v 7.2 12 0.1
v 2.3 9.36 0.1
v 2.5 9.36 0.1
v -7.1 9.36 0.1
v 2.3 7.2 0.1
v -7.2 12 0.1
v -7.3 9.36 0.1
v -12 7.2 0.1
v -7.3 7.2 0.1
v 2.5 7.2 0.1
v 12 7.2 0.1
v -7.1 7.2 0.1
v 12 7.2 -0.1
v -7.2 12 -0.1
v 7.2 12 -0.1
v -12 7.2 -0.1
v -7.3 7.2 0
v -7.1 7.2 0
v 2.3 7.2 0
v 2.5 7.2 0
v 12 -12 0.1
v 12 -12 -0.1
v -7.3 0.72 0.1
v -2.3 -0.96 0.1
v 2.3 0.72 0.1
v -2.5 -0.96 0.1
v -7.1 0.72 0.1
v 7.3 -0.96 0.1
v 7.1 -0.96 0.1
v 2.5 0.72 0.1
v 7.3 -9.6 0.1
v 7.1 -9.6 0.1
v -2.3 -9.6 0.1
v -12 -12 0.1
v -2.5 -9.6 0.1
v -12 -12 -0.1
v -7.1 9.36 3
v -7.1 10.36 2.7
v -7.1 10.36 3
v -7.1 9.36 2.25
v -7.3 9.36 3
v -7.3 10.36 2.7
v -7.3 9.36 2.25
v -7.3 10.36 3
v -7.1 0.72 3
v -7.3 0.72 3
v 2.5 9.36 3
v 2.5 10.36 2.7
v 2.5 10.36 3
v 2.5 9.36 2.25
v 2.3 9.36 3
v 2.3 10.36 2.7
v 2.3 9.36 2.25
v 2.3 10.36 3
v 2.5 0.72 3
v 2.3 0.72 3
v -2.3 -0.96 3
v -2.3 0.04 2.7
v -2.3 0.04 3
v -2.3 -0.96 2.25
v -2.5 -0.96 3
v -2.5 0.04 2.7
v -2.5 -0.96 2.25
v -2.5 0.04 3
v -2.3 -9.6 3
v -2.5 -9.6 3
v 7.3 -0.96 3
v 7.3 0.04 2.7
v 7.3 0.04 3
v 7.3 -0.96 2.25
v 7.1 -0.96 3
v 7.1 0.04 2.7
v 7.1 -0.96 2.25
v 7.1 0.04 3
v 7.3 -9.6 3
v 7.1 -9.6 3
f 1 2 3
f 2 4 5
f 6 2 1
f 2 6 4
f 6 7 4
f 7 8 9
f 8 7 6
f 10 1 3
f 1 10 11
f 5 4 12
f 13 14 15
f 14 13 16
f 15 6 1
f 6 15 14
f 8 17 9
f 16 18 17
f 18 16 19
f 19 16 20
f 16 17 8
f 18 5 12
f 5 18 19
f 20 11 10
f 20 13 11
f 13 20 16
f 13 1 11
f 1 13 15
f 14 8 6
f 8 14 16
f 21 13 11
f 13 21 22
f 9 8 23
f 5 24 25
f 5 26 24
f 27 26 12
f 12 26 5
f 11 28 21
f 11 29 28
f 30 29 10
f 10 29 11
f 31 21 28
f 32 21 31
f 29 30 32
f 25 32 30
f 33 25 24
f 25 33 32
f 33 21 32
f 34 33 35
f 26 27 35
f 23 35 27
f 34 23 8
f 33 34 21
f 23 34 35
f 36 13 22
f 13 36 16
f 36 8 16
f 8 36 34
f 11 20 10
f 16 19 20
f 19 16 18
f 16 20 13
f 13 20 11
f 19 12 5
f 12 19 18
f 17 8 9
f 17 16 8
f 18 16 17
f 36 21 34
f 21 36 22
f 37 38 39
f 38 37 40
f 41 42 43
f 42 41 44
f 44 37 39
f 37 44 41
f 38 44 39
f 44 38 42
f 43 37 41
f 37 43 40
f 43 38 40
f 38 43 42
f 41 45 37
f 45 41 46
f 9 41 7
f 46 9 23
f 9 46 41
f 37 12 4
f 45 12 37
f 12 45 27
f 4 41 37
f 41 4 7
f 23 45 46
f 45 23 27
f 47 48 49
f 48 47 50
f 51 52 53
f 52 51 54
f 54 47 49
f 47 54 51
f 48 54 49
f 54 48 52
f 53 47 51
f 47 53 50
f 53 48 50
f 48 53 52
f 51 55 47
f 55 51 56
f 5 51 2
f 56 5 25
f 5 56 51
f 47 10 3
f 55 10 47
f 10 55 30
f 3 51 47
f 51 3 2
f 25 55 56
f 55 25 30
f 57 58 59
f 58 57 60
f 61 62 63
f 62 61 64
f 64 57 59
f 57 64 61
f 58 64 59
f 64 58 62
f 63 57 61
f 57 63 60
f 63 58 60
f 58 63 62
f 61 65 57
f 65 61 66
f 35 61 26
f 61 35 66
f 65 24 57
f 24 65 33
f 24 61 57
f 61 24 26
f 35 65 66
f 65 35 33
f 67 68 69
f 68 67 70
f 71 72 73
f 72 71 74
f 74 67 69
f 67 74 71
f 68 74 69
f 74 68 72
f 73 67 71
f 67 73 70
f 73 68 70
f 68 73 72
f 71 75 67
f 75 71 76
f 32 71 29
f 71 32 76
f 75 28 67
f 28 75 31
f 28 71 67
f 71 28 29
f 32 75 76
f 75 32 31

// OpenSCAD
// file: library/sheet.scad
//-----------------------------------------------------------------------------
// conventions:
//  * x -- width
//  * y -- height
//  * z -- thickness
//  * sheets start at a corner, thickness centered
//-----------------------------------------------------------------------------

function thickness() = 0.2;

//-----------------------------------------------------------------------------

module trapezium(wt, wb, h, thick = thickness()) {
  a = wb - wt;
  b = h;
  rot = atan(a / b);

  cut_h = h / cos(rot) * 1.1;
  // cut_w doesn't need to be calculated; it's enough to use max(wt,wb)
  // (an overkill, but who cares?)

  w = max(wb, wt); // longer of the widths

  difference() {
    sheet(w, h, thick);

    translate([wb, 0, 0])
    rotate([0, 0, rot])
    sheet(w, cut_h, thick * 2);
  }
}

//-----------------------------------------------------------------------------

// direction of border adds `adjust' to specified width and height in the
// direction, so no plane is left uncovered
module cut(w = 2, h = 2, thick = thickness(), adjust = 0.01,
           top = false, down = false, left = false, right = false) {
  cut_w = (left && right) ? w + 2 * adjust : (left || right) ? w + adjust : w;
  cut_h = (top  && down)  ? h + 2 * adjust : (top  || down)  ? h + adjust : h;
  cut_x = left ? -adjust : 0;
  cut_y = down ? -adjust : 0;

  translate([cut_x, cut_y, -thick])
  cube([cut_w, cut_h, thick * 2]);
}

//-----------------------------------------------------------------------------

// TODO: orientation
module sheet(w = 10, h = 10, thick = thickness()) {
  translate([0, 0, -thick / 2])
  cube([w, h, thick]);
}

//-----------------------------------------------------------------------------
// vim:ft=openscad
// main file
//----------------------------------------------------------------------------

use <library/sheet.scad>;

//----------------------------------------------------------------------------

hanger_width = 24;
hanger_height = 24;
hook_width = 3;
hook_length = hanger_height * .4;

hook_start = hanger_width * .2;
hook_end = hanger_width * .8;
hook_step = (hook_end - hook_start) / 3;

//----------------------------------------------------------------------------

translate([-hanger_width / 2, -hanger_height / 2, 0]) {
  back(w = hanger_width, h = hanger_height);

  color("green") {
    translate([hook_start + 0 * hook_step, hanger_height * .53, 0])
    hook(w = hook_width, h = hook_length);

    translate([hook_start + 2 * hook_step, hanger_height * .53, 0])
    hook(w = hook_width, h = hook_length);

    translate([hook_start + 1 * hook_step, hanger_height * .1, 0])
    hook(w = hook_width, h = hook_length);

    translate([hook_start + 3 * hook_step, hanger_height * .1, 0])
    hook(w = hook_width, h = hook_length);
  }
}

//----------------------------------------------------------------------------

module hook(w = 3, h = 10) {
  plain_h = .9 * h;
  hook_h = h - plain_h;

  rotate([0, -90, 0]) {
    sheet(w = w, h = plain_h);

    translate([w, plain_h, 0])
    rotate([0, 180, 0])
    trapezium(wt = .1 * w, wb = .25 * w, h = 1);
  }
}

//----------------------------------------------------------------------------

module back(w = 4, h = 4) {
  plain_h = h * .8;
  cut_h = h - plain_h;

  sheet(h = plain_h, w = w);

  translate([w / 2, plain_h, 0])
  trapezium(wt = w / 2 - cut_h, wb = w / 2, h = cut_h);

  translate([w / 2, plain_h, 0])
  rotate([0, 180, 0])
  trapezium(wt = w / 2 - cut_h, wb = w / 2, h = cut_h);
}

//----------------------------------------------------------------------------
// vim:ft=openscad
